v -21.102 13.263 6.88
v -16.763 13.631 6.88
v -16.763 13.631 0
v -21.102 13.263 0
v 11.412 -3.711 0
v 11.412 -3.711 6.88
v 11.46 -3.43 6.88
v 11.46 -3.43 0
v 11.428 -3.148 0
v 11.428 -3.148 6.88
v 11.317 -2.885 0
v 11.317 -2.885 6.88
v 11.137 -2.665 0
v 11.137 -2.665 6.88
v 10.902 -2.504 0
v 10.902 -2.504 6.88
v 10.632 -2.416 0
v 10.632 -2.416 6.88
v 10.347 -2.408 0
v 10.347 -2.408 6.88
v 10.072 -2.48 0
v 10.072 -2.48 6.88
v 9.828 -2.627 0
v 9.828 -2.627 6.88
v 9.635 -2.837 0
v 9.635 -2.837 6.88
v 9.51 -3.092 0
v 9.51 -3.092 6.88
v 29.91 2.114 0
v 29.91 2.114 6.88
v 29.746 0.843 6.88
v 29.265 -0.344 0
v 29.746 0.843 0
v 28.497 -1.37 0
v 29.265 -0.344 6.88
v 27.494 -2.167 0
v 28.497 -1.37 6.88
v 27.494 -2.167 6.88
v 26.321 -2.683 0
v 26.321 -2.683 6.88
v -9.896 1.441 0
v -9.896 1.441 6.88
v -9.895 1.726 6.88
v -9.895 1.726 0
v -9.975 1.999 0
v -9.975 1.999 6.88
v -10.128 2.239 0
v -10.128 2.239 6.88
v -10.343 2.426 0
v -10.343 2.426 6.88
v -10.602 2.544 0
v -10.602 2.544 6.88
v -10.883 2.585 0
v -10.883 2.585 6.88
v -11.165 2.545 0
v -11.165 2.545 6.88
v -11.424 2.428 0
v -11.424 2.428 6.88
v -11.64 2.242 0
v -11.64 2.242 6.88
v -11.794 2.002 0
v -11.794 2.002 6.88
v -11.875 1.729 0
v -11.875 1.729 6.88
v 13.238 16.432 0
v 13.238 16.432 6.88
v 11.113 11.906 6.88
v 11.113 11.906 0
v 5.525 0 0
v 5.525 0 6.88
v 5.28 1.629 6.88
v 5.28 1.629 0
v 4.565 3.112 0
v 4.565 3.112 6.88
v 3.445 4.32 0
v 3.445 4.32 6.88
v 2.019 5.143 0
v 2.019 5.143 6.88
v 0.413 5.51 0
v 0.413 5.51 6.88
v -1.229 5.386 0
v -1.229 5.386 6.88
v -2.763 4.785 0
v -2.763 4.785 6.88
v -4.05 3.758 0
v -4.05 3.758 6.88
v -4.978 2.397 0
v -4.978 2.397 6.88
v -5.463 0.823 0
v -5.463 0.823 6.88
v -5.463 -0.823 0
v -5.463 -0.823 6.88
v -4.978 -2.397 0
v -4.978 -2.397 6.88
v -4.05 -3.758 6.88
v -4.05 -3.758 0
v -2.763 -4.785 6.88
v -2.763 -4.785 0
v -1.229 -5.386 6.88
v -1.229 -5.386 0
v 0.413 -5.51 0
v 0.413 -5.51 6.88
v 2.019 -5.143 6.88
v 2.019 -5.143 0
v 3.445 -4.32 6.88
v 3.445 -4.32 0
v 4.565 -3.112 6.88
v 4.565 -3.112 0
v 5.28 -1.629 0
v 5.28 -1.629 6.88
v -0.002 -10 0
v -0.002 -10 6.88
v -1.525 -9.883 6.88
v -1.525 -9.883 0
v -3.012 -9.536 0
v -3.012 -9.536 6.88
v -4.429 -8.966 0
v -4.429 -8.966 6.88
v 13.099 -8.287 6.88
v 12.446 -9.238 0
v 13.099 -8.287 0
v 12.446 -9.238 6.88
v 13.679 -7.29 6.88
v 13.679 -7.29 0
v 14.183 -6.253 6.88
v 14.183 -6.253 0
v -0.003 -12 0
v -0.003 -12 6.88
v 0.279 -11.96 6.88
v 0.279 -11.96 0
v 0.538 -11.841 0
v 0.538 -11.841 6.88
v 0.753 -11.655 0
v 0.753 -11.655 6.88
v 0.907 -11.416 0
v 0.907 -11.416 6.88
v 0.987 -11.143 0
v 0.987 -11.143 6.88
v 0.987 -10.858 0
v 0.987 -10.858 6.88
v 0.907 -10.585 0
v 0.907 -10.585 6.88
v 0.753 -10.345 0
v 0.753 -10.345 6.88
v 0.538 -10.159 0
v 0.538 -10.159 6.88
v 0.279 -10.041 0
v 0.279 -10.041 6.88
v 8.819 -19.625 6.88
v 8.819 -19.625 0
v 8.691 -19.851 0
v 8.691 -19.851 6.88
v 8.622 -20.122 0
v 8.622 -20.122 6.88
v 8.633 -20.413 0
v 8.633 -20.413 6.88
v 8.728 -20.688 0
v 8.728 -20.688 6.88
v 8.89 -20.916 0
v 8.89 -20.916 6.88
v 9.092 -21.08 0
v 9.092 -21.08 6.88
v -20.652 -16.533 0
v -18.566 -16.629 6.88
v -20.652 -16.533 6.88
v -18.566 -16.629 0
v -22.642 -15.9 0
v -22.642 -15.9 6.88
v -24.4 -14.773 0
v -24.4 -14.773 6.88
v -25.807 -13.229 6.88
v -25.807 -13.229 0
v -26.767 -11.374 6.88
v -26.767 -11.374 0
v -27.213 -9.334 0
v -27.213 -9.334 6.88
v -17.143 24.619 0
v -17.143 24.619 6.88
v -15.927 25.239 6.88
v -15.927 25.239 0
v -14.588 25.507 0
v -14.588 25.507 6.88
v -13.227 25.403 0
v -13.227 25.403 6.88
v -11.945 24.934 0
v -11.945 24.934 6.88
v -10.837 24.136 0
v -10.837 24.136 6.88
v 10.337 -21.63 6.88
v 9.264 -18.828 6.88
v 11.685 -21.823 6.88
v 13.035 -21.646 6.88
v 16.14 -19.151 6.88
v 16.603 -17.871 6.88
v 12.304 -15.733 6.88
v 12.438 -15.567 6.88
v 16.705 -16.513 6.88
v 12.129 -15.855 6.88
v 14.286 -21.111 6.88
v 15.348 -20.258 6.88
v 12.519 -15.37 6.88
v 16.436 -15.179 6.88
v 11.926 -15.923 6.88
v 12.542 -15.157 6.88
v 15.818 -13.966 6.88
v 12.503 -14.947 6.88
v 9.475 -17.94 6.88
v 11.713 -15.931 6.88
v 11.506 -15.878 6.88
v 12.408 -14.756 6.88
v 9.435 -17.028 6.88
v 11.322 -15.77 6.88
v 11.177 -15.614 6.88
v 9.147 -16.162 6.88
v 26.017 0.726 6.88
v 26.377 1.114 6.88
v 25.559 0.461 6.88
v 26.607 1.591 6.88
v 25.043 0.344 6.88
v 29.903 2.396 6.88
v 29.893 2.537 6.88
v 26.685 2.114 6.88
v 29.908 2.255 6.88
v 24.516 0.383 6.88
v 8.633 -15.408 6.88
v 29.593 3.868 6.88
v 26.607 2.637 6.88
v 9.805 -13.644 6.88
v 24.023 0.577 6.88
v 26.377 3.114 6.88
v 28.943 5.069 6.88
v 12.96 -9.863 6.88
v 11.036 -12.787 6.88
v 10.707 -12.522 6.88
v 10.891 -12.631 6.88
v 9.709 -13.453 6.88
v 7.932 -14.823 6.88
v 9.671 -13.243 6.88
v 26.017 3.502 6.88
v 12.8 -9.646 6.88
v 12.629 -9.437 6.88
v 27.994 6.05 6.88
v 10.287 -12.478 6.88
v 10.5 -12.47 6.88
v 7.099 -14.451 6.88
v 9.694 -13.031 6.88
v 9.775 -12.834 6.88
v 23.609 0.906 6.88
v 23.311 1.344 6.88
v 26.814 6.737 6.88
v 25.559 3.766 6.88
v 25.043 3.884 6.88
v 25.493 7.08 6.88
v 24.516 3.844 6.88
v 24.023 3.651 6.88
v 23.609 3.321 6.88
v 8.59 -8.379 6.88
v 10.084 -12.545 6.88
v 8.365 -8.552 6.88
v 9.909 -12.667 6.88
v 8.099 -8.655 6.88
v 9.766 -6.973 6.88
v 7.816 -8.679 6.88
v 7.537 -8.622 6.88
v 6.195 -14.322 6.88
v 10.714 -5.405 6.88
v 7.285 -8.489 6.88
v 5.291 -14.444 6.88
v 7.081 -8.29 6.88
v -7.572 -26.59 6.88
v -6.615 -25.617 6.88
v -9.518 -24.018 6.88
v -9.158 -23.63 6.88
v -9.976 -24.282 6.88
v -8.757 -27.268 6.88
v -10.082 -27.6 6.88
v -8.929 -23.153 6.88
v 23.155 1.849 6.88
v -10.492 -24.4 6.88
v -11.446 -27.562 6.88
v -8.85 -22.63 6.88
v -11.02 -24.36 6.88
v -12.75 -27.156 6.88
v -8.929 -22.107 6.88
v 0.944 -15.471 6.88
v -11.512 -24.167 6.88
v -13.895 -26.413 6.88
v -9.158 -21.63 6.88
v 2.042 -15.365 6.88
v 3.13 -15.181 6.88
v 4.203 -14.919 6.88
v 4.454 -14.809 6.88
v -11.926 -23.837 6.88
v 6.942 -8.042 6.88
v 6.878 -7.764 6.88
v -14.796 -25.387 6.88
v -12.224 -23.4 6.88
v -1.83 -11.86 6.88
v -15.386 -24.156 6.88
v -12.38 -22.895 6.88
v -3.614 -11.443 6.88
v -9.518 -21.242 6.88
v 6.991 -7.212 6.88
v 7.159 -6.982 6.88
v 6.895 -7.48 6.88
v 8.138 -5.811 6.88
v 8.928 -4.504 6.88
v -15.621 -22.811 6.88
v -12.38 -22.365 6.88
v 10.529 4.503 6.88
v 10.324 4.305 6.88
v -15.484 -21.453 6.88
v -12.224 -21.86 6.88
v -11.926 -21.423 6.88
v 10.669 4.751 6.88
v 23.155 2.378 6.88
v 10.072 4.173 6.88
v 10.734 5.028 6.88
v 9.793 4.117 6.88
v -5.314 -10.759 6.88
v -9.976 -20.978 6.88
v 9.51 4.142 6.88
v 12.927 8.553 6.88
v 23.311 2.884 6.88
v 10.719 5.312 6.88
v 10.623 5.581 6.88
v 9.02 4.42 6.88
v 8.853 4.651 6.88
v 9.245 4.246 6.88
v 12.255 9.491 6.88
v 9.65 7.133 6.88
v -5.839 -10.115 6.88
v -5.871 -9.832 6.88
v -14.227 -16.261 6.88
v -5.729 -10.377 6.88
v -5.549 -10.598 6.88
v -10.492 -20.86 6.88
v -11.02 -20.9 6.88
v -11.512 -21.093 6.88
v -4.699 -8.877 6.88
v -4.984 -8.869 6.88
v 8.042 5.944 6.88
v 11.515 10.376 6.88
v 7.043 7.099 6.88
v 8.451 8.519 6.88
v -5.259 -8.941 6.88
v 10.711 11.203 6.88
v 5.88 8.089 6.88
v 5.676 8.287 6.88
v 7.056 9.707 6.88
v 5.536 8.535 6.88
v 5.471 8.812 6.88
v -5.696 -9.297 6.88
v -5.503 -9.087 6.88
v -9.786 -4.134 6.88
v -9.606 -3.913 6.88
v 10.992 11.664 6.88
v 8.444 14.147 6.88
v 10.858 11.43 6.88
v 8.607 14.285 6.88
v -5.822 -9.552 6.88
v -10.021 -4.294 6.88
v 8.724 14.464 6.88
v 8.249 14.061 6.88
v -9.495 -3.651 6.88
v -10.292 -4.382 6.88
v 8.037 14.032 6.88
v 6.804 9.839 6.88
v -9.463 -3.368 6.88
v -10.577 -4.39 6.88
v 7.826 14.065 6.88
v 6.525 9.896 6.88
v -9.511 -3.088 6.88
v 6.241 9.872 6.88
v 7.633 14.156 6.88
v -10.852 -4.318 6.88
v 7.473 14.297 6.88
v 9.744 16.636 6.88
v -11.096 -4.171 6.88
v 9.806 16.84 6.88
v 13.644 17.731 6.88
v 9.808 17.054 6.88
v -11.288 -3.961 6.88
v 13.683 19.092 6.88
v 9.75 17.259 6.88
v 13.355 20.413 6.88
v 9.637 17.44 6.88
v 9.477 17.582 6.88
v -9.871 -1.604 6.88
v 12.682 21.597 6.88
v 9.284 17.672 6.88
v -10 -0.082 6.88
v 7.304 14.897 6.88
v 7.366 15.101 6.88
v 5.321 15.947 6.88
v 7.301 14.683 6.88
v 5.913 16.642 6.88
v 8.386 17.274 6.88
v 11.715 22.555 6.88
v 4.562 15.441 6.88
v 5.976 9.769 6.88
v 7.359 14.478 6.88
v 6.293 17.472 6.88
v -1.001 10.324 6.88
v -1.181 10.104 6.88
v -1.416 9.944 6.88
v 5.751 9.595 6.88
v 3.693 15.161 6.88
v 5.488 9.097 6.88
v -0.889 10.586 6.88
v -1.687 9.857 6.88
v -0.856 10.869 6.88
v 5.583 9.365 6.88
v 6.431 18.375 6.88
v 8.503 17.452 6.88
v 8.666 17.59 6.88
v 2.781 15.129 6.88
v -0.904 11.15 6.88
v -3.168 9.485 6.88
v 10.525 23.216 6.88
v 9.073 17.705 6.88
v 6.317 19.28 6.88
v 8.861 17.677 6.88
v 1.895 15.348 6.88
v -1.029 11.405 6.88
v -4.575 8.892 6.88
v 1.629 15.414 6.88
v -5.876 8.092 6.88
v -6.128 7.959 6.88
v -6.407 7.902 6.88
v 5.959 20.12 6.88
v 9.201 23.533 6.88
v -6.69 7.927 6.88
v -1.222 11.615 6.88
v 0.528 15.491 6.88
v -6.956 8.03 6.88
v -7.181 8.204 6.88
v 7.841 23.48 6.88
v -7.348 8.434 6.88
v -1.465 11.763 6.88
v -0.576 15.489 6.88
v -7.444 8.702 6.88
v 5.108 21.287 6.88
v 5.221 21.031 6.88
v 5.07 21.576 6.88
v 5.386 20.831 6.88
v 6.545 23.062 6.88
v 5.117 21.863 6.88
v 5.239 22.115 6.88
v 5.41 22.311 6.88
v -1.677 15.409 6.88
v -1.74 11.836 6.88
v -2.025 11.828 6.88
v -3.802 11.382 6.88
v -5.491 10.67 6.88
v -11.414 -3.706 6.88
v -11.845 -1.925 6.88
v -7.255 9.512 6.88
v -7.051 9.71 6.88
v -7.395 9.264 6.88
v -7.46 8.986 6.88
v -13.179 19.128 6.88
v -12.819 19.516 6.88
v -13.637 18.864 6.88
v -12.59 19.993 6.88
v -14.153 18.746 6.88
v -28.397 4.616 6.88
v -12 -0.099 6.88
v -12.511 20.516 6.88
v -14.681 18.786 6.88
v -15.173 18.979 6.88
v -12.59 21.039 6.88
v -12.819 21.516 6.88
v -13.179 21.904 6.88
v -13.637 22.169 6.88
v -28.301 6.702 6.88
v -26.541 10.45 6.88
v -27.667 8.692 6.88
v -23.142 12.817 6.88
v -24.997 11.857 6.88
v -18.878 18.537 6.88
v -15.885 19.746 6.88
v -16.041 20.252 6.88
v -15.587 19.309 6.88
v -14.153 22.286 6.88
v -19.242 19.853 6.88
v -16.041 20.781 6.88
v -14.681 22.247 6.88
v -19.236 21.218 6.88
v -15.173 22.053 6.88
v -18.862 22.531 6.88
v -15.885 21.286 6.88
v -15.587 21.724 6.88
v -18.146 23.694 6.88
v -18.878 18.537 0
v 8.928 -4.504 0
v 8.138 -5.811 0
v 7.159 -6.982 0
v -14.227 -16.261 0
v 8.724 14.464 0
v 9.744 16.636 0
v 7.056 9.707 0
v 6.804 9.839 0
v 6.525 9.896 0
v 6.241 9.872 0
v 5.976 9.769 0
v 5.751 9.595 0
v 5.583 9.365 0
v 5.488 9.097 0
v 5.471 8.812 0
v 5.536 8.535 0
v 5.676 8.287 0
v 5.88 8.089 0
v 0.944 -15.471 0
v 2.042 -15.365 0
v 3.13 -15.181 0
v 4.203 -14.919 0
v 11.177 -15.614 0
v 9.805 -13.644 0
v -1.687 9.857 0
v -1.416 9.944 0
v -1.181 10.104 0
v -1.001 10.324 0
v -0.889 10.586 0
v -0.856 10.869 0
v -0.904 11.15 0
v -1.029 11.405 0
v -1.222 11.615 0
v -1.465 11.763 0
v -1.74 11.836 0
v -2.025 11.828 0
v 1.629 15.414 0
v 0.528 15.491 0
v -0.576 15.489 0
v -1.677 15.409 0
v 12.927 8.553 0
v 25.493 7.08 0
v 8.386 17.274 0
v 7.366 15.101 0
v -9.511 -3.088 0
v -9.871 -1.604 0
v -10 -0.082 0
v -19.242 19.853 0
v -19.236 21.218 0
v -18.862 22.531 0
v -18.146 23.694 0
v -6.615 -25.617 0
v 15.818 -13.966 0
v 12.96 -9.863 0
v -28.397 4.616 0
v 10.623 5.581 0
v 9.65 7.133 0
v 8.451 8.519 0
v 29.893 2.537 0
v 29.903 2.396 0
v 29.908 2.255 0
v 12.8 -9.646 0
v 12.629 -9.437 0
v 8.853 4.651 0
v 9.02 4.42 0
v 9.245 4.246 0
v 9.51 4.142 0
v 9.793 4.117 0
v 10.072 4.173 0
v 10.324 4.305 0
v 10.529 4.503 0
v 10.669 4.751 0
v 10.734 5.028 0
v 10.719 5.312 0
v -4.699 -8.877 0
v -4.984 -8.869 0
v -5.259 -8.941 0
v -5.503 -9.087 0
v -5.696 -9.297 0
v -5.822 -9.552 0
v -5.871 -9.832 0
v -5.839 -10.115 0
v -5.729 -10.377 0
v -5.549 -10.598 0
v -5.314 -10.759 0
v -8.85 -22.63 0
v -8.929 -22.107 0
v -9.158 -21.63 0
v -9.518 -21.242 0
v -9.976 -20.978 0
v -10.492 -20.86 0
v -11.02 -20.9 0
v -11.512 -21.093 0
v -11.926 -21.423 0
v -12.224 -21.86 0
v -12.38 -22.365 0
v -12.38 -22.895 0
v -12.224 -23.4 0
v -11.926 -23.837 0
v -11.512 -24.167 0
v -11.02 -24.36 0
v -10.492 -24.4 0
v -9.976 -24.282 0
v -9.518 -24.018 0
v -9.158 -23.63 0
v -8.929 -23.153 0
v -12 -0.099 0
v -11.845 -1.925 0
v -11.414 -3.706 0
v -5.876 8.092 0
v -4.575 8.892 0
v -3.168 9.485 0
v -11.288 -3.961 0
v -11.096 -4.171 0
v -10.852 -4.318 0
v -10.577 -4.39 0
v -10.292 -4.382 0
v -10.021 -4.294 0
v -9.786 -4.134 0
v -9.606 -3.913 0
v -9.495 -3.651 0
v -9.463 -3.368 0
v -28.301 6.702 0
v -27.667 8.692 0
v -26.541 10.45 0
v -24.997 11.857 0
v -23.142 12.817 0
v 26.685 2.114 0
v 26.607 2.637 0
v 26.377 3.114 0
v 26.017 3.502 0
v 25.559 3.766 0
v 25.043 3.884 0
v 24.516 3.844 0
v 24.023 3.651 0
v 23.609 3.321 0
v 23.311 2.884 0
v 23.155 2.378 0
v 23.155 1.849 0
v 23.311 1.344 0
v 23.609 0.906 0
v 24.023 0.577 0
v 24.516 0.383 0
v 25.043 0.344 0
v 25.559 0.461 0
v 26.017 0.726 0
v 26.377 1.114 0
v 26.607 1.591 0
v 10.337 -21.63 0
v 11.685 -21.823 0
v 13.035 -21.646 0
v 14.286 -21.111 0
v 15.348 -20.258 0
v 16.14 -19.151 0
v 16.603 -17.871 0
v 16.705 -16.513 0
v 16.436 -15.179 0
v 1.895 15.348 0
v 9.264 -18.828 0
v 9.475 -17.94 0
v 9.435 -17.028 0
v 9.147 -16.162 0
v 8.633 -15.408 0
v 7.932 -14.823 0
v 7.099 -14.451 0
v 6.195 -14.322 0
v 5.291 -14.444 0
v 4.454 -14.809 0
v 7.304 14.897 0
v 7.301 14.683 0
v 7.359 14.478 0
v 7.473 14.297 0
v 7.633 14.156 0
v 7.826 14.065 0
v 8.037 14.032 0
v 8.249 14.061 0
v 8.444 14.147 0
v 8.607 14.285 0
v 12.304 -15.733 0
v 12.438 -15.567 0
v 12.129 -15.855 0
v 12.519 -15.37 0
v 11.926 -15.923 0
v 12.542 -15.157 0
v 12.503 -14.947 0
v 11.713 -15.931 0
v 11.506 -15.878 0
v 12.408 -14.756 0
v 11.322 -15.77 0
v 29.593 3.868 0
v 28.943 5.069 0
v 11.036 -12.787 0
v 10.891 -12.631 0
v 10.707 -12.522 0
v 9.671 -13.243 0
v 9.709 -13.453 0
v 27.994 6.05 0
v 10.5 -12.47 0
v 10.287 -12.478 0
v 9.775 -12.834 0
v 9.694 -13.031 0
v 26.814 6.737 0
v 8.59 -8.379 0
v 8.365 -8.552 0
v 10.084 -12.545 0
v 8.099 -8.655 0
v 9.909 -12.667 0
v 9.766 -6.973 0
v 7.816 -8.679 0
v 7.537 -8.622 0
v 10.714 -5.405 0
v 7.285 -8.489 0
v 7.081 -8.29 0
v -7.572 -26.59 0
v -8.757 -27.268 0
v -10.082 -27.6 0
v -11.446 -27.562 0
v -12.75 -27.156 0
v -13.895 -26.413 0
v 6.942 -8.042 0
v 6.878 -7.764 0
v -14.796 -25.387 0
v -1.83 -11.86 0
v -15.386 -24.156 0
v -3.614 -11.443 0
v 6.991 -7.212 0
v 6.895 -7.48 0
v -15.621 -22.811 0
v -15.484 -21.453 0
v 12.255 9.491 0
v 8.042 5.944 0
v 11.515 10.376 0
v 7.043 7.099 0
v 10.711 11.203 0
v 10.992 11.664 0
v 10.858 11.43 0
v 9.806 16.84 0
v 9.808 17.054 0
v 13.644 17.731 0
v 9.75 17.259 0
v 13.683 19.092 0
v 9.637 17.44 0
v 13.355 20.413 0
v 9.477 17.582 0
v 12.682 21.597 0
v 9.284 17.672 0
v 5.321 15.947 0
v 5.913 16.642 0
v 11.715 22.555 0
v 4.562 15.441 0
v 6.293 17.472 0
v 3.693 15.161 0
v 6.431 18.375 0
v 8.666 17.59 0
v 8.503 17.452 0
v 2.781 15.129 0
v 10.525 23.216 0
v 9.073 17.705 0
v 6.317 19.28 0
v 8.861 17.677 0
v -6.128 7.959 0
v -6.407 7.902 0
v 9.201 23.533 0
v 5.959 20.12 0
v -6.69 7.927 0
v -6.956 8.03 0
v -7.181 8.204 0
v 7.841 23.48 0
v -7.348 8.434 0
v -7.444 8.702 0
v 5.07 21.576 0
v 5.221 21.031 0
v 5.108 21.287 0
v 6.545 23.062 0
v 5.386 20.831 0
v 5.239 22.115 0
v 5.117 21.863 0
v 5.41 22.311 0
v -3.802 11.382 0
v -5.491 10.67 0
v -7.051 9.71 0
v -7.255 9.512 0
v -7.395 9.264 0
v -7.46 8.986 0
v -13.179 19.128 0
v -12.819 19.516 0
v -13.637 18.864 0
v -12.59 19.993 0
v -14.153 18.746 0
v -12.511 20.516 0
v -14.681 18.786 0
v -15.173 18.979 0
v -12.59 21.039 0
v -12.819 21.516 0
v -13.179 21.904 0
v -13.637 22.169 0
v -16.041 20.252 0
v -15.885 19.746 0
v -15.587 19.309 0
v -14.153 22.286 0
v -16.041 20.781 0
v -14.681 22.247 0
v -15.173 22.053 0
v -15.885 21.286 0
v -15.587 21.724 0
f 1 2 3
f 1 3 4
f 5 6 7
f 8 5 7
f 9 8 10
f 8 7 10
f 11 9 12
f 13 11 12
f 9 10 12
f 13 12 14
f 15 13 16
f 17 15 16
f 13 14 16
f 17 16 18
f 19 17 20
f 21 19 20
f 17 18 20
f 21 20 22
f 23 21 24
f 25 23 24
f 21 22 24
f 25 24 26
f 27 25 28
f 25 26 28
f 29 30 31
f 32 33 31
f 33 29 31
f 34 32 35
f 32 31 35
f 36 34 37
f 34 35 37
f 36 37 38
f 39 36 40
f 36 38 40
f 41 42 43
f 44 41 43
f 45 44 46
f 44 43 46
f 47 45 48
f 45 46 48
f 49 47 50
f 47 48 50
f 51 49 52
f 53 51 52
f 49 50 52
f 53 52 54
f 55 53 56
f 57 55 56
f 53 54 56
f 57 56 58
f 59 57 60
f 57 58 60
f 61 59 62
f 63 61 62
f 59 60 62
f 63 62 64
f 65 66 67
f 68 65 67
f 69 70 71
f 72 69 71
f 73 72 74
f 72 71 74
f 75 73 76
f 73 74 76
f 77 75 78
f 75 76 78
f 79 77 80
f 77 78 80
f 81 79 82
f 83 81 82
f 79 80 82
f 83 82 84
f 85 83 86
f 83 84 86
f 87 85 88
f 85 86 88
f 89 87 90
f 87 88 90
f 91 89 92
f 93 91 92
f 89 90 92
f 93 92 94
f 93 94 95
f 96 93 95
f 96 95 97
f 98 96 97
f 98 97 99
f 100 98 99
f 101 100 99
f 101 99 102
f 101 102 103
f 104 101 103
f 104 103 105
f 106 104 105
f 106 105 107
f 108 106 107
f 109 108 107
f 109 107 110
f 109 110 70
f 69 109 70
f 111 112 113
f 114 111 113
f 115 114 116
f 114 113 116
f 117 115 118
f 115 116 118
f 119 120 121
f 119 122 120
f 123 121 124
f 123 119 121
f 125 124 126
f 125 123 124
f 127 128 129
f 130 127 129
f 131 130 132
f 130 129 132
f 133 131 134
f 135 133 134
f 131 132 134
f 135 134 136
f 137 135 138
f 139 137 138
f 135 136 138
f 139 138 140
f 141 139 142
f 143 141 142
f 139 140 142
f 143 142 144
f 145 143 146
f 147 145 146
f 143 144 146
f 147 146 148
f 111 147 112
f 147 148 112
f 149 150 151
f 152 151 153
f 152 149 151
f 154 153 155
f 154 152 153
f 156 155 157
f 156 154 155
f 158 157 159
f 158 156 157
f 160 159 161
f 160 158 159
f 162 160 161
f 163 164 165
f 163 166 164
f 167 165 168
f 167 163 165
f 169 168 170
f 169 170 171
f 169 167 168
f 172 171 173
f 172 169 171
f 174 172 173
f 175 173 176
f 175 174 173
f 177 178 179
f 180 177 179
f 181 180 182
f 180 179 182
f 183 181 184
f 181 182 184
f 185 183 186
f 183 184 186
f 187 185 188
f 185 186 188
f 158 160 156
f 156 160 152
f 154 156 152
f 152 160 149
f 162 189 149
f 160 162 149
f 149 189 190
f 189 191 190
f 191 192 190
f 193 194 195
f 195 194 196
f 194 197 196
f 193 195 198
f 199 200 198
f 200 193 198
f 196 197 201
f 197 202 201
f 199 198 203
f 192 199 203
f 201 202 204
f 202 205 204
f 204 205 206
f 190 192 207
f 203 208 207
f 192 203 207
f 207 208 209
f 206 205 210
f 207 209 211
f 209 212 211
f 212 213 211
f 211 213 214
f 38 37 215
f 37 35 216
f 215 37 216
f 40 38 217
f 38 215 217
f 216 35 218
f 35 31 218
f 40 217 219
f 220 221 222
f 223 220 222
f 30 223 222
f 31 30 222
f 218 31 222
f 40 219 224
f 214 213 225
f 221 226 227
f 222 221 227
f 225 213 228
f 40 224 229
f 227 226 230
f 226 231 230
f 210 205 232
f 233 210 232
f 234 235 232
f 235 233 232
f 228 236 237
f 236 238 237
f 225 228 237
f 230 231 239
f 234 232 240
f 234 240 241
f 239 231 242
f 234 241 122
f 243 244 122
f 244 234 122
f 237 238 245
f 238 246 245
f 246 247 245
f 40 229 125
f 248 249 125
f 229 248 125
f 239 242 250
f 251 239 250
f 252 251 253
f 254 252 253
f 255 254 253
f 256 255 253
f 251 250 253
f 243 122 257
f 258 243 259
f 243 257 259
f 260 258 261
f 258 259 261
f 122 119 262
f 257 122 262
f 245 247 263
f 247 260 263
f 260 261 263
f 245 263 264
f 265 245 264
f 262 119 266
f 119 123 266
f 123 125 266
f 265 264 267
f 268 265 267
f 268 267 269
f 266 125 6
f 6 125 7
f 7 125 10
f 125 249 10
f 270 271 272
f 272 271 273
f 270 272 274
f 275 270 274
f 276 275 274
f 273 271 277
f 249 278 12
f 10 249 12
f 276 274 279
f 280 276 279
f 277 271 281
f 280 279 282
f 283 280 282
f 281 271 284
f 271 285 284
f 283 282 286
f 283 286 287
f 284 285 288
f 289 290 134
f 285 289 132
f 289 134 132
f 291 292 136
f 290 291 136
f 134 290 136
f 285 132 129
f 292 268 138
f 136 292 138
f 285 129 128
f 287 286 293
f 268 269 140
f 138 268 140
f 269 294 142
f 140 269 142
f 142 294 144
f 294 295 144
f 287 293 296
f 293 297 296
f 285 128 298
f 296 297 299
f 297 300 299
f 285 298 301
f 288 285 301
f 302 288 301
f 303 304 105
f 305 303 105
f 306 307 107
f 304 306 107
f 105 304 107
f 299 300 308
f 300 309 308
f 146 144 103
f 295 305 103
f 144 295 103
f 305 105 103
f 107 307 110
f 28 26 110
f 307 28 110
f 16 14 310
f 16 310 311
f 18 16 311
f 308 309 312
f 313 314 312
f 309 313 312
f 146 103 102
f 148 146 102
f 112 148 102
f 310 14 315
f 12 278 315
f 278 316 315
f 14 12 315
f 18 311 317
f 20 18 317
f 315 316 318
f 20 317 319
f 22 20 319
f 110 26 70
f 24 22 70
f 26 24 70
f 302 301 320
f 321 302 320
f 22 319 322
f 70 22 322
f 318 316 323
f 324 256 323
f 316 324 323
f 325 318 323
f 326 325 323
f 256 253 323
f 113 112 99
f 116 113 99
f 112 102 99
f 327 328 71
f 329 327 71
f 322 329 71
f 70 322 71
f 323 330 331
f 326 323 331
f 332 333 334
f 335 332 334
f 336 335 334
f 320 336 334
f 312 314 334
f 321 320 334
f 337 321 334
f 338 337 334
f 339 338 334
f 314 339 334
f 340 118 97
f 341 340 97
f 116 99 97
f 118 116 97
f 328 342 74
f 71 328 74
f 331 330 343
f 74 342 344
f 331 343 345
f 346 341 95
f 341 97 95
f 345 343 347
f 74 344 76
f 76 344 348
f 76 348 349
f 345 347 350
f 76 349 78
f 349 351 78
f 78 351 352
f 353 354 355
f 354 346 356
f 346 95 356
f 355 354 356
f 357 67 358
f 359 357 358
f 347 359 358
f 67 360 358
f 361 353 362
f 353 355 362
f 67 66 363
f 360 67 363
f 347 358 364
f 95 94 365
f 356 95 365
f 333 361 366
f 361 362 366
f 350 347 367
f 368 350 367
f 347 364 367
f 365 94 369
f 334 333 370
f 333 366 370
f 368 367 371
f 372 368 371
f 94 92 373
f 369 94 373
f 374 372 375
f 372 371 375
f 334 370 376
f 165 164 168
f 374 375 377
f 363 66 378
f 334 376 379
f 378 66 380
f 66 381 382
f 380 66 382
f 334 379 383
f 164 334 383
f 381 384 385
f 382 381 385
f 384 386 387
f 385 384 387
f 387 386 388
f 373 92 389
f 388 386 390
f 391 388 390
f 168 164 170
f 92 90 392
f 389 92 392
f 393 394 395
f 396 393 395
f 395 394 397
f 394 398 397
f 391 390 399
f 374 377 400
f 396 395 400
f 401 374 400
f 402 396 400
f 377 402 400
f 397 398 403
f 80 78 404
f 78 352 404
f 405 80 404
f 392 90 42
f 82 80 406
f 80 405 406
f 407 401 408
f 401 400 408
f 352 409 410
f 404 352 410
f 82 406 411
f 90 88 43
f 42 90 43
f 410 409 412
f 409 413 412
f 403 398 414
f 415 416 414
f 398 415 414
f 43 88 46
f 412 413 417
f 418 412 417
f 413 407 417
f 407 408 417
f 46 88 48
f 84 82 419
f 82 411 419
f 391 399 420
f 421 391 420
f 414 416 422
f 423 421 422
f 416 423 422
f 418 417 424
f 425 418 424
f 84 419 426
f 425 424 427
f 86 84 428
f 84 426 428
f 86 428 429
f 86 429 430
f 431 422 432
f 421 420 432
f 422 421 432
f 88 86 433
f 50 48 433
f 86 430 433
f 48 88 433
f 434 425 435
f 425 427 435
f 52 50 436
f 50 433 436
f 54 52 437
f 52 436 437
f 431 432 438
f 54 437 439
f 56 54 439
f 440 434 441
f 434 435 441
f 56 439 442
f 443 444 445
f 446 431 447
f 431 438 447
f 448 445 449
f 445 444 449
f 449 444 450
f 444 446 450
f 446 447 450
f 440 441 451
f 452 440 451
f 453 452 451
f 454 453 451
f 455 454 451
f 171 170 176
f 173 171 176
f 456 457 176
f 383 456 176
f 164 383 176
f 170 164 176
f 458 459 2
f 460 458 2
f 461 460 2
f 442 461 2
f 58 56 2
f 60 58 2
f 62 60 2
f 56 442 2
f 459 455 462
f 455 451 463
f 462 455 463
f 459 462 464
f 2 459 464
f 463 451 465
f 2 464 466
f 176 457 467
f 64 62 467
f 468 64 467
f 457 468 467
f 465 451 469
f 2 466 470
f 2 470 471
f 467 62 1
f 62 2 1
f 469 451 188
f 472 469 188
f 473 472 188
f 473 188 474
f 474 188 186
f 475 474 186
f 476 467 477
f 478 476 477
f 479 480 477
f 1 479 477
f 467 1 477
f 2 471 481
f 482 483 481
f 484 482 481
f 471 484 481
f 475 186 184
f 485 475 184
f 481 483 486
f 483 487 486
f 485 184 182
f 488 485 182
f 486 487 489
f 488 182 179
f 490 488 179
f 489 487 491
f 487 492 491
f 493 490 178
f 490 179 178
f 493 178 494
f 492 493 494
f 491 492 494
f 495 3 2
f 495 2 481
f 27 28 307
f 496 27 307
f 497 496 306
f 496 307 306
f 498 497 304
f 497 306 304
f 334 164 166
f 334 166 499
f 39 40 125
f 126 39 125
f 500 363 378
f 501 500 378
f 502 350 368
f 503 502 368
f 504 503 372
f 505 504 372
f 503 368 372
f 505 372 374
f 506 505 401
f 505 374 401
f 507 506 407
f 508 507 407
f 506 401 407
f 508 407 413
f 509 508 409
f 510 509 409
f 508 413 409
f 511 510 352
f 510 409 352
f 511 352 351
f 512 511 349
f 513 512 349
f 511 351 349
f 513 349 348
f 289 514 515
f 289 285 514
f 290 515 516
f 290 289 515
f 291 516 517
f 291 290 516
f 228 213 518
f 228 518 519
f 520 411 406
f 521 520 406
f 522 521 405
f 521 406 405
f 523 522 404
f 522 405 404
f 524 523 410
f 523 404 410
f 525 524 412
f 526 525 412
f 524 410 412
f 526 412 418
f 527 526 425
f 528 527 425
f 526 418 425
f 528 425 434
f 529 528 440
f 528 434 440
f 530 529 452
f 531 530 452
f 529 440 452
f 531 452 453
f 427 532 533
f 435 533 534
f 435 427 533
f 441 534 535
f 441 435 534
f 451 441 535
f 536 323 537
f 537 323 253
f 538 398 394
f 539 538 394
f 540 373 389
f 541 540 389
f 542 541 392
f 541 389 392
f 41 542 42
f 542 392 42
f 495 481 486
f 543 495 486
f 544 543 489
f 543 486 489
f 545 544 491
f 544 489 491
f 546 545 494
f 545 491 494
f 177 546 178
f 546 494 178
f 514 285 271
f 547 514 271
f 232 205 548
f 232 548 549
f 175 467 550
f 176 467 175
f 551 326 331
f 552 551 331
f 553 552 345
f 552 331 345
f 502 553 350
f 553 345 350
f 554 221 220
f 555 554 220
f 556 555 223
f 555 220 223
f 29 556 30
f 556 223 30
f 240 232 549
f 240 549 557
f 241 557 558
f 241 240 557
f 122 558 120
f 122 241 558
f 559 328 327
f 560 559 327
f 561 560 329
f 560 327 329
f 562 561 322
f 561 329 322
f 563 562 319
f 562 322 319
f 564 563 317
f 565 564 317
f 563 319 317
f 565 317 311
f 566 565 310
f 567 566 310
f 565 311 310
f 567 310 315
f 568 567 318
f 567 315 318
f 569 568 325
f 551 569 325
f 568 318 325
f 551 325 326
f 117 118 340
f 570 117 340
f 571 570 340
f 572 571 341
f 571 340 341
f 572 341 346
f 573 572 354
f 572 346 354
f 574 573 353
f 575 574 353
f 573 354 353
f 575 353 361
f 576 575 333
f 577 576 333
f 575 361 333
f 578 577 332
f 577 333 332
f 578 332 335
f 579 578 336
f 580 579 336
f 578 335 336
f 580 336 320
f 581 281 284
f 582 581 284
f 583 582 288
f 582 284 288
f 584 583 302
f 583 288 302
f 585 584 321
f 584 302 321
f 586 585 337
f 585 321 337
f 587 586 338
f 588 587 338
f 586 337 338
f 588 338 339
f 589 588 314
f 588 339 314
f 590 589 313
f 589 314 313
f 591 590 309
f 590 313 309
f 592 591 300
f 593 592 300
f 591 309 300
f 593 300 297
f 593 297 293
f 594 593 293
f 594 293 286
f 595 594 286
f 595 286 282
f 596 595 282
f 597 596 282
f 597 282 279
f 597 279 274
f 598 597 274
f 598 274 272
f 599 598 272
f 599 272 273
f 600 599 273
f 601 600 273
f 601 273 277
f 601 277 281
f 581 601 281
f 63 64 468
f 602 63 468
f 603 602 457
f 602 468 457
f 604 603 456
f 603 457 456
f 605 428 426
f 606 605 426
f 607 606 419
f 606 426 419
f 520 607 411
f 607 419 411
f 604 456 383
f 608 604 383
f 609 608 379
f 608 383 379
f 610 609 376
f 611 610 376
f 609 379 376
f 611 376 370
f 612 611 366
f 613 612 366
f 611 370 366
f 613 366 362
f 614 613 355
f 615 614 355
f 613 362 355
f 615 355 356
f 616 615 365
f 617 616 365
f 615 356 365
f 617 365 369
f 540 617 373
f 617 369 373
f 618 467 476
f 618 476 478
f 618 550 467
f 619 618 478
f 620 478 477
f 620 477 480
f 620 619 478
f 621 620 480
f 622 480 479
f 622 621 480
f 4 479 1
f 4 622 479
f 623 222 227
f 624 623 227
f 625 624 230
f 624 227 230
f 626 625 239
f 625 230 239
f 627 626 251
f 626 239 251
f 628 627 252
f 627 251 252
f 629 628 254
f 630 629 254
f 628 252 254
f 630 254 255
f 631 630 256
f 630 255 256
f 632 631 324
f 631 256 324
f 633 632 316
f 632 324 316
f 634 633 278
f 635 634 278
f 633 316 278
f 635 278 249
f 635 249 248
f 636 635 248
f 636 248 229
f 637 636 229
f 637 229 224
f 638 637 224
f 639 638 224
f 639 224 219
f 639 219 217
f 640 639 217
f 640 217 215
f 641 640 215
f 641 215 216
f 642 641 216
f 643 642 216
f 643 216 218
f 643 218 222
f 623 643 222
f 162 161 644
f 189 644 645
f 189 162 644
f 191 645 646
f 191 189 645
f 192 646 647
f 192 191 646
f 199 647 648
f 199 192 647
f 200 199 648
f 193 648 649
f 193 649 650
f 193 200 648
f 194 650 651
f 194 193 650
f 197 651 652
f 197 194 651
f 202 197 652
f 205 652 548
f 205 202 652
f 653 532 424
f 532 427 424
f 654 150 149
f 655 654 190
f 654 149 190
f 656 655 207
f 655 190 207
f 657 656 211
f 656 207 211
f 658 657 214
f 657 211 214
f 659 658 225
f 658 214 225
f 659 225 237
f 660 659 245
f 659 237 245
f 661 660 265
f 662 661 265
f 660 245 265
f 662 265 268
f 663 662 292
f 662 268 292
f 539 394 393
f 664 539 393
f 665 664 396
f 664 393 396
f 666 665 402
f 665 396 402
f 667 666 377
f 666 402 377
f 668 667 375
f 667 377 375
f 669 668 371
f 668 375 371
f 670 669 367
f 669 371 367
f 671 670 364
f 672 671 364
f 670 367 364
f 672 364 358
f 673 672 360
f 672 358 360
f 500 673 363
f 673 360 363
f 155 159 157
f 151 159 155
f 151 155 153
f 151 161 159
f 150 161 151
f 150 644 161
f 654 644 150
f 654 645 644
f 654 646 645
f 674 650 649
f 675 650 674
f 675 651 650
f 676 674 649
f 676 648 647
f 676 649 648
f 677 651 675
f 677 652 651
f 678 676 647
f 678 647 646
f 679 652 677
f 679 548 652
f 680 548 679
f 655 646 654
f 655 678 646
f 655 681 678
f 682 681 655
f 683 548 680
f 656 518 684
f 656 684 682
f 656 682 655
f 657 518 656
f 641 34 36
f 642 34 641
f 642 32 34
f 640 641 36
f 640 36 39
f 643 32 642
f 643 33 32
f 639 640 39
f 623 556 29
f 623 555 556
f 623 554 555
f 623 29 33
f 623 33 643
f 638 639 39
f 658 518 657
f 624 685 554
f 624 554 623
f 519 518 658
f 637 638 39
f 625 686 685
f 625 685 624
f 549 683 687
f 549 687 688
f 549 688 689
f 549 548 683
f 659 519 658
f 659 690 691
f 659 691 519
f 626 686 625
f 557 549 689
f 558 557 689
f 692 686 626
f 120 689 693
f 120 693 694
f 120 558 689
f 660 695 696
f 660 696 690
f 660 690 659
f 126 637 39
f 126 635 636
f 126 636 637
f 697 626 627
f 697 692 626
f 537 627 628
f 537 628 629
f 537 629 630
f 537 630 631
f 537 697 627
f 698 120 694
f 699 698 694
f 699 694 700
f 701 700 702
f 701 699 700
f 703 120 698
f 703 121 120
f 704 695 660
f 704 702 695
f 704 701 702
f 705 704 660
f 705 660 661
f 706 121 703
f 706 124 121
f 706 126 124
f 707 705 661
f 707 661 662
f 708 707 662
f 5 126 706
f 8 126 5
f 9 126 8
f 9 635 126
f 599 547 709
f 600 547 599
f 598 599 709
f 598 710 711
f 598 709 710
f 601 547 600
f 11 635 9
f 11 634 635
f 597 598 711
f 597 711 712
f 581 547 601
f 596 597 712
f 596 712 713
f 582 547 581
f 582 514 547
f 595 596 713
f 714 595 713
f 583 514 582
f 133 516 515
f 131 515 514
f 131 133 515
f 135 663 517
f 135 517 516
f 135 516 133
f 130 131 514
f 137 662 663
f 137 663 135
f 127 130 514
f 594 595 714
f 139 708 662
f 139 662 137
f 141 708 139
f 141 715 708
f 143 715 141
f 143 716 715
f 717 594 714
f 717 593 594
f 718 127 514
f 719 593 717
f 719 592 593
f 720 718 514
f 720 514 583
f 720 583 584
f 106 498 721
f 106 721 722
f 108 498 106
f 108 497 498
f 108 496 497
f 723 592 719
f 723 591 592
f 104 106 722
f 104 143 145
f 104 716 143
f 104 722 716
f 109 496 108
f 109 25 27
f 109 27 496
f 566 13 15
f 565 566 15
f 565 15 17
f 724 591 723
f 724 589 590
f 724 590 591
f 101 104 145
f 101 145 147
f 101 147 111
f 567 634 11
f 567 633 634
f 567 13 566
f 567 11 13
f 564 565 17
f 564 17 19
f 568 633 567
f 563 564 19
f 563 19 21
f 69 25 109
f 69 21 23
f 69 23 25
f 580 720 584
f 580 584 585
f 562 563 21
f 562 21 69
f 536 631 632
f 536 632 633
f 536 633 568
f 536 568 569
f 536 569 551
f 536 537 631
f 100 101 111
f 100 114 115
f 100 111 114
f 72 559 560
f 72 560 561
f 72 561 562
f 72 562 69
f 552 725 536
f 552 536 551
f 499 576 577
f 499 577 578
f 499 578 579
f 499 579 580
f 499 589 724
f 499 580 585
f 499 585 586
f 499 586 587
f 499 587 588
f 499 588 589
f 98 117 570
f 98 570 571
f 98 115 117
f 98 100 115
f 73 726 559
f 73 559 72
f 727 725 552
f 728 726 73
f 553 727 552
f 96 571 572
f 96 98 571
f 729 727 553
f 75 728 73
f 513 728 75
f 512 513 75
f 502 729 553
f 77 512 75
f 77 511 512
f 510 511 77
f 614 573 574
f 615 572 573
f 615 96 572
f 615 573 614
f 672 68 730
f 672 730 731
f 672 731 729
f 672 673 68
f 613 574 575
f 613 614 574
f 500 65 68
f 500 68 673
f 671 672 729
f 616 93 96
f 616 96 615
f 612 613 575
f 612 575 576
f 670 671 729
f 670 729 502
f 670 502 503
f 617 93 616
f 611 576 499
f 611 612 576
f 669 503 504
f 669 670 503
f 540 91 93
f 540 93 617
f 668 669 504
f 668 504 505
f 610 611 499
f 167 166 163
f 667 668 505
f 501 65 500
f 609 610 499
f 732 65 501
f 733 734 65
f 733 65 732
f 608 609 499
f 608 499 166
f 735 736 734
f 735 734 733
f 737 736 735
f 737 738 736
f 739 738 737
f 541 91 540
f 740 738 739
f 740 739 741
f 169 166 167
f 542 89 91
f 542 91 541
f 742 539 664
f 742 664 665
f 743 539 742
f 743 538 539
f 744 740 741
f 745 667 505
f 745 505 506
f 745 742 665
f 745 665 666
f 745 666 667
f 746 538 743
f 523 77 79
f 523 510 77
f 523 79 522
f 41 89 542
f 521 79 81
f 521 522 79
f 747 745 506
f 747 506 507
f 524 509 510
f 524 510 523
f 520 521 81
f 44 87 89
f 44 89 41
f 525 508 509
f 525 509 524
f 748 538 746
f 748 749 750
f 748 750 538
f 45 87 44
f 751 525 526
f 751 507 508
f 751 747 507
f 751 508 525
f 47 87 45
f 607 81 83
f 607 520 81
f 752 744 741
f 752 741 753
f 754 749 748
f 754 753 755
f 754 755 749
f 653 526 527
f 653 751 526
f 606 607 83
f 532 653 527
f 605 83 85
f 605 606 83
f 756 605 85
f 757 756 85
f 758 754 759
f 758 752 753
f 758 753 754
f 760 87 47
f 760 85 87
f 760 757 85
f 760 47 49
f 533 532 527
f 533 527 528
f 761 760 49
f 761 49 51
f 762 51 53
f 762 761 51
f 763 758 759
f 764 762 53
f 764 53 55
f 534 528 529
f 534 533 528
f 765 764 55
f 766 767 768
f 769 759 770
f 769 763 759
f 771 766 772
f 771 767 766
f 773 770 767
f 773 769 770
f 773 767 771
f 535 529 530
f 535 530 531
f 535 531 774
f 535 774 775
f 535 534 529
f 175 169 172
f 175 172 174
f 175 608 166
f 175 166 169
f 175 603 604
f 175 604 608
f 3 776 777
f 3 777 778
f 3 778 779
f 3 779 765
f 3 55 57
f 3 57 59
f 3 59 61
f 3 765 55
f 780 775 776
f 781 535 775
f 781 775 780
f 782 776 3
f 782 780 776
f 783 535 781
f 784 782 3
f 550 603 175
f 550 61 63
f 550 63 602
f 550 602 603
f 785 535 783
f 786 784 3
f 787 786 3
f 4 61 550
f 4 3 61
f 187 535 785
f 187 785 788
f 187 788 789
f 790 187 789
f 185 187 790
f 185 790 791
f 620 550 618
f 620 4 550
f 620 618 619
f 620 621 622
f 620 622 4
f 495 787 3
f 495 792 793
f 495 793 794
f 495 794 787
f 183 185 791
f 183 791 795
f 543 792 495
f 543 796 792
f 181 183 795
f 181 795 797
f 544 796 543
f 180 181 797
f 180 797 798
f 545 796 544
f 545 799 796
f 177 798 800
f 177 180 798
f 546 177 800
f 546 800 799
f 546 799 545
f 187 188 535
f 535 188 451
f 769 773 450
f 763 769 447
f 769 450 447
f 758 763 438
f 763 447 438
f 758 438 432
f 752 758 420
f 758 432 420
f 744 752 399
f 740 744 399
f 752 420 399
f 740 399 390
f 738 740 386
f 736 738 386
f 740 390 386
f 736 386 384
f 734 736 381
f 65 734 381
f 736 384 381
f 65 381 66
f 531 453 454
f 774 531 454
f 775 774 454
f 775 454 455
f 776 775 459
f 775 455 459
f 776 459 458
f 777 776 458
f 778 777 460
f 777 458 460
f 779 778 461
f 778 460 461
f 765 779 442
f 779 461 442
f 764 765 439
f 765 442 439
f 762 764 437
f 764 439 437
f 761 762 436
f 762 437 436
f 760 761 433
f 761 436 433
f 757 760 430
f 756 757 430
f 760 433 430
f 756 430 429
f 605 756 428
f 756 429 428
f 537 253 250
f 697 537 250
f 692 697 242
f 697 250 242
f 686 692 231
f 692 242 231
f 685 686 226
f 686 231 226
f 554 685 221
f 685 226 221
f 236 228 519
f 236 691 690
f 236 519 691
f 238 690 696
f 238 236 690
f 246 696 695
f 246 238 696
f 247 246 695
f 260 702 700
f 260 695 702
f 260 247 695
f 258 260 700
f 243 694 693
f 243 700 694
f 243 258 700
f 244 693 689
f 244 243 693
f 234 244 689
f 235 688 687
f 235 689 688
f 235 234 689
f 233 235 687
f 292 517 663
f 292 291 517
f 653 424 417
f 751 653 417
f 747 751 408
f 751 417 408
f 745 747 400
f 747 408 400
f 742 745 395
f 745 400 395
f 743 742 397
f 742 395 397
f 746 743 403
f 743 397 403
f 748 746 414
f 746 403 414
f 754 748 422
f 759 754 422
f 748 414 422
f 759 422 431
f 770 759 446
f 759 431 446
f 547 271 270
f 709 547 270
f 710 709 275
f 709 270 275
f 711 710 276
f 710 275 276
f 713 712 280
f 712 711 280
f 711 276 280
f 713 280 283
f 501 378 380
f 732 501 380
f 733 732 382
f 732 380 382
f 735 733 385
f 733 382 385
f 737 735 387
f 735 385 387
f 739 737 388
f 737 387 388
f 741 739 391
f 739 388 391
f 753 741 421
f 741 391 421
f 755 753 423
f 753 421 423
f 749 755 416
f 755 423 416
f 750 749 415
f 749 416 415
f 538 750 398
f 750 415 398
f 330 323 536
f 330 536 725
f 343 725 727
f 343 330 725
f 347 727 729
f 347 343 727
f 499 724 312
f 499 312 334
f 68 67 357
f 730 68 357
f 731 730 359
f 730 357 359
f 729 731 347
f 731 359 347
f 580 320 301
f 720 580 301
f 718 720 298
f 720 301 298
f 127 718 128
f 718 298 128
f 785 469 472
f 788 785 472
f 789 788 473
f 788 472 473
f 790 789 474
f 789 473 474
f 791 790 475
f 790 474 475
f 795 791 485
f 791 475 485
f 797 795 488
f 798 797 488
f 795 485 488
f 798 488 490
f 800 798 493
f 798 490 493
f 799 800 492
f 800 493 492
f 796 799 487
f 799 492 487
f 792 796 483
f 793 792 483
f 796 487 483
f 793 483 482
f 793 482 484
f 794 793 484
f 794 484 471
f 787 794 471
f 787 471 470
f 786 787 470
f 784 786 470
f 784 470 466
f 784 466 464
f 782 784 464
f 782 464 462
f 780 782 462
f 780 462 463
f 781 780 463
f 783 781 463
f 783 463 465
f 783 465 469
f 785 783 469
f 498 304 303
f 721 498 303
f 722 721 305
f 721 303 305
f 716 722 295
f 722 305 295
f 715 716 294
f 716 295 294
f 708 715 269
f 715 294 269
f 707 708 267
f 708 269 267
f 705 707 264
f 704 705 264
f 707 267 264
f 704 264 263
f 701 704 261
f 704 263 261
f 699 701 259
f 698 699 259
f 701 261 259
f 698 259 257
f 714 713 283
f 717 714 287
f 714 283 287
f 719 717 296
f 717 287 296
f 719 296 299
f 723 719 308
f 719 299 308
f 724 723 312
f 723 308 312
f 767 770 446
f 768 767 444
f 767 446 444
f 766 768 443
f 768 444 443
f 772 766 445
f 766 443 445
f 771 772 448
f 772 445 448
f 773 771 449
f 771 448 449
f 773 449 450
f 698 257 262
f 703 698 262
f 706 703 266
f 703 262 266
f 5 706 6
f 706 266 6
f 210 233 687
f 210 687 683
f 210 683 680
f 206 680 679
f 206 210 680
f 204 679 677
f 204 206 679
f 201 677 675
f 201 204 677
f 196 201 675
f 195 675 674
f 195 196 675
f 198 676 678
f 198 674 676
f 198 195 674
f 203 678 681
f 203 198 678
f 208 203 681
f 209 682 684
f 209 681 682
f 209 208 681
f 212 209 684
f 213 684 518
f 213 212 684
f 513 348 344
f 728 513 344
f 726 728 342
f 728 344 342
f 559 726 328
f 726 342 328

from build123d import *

# Parameters (mm, degrees)
SKETCH1_R           = 30
BOSS_EXTRUDE1_DEPTH = 6.88
SKETCH2_R           = 1.775
CUT_EXTRUDE1_DEPTH  = 7.88
SKETCH3_R           = 5.525
CUT_EXTRUDE2_DEPTH  = 7.88
SKETCH4_R           = 15.5
SKETCH4_R_2         = 5.525
BOSS_EXTRUDE2_DEPTH = 6.88
BOSS_EXTRUDE3_DEPTH = 6.88
FILLET1_R           = 8
BOSS_EXTRUDE4_DEPTH = 6.88
SKETCH8_R           = 3.307099625
CUT_EXTRUDE3_DEPTH  = 7.88
FILLET2_R           = 1
CUT_EXTRUDE4_DEPTH  = 7.8800001
CIRPATTERN7_COUNT   = 5


with BuildPart() as part:
    # Sketch1 → Boss-Extrude1 (new body)
    with BuildSketch(Plane.XY):
        Circle(SKETCH1_R)
    extrude(amount=BOSS_EXTRUDE1_DEPTH)

    # Sketch2 → Cut-Extrude1 (cut, through all)
    with BuildSketch(Plane.XY.offset(6.88)):
        with BuildLine():
            ThreePointArc((-12.74957851, -27.155998376), (-15.133105802, -24.791899388), (-15.484190638, -21.453201167))
            Line((-15.484190638, -21.453201167), (-10.504897898, -0.891395226))
            Line((-10.504897898, -0.891395226), (-18.877603208, 18.537424231))
            ThreePointArc((-18.877603208, 18.537424231), (-19.094099282, 21.887543025), (-17.142995258, 24.619458028))
            ThreePointArc((-17.142995258, 24.619458028), (-29.892573711, -2.536540344), (-12.74957851, -27.155998376))
        make_face()
        with BuildLine():
            ThreePointArc((29.89257372, 2.536540246), (12.74957851, 27.155998377), (-17.142995258, 24.619458028))
            ThreePointArc((-17.142995258, 24.619458028), (-13.90386181, 25.50160376), (-10.836921884, 24.136303033))
            Line((-10.836921884, 24.136303033), (4.480478038, 9.543206057))
            Line((4.480478038, 9.543206057), (25.492681909, 7.079771826))
            ThreePointArc((25.492681909, 7.079771826), (28.502217973, 5.59220348), (29.89257372, 2.536540246))
        make_face()
        with BuildLine():
            ThreePointArc((-6.6150787, -25.617196056), (-9.408118678, -27.479746561), (-12.74957851, -27.155998376))
            ThreePointArc((-12.74957851, -27.155998376), (16.085904462, -25.322789689), (30, 0))
            ThreePointArc((30, 0), (29.973131398, 1.269407029), (29.89257372, 2.536540246))
            ThreePointArc((29.89257372, 2.536540246), (29.905999993, 2.325351424), (29.910478091, 2.113783634))
            ThreePointArc((29.910478091, 2.113783634), (28.913799972, -0.881782076), (26.321112522, -2.683101866))
            Line((26.321112522, -2.683101866), (6.02441986, -8.65181083))
            Line((6.02441986, -8.65181083), (-6.6150787, -25.617196056))
        make_face()
        with Locations((-10.62464872, -22.629998665)):
            Circle(SKETCH2_R)
        with Locations((24.910478091, 2.113783634)):
            Circle(SKETCH2_R)
        with Locations((-14.285829371, 20.51621503)):
            Circle(SKETCH2_R)
    extrude(amount=-CUT_EXTRUDE1_DEPTH, mode=Mode.SUBTRACT)

    # Sketch3 → Cut-Extrude2 (cut, through all)
    with BuildSketch(Plane.XY.offset(6.88)):
        Circle(SKETCH3_R)
    extrude(amount=-CUT_EXTRUDE2_DEPTH, mode=Mode.SUBTRACT)

    # Sketch4 → Boss-Extrude2 (add)
    with BuildSketch(Plane.XY.offset(6.88)):
        Circle(SKETCH4_R)
        Circle(SKETCH4_R_2, mode=Mode.SUBTRACT)
    extrude(amount=-BOSS_EXTRUDE2_DEPTH)

    # Sketch6 → Boss-Extrude3 (add)
    with BuildSketch(Plane.XY.offset(6.88)):
        with BuildLine():
            Line((-5.159411249, 14.616103296), (-29.073470217, 12.586871007))
            Line((-29.073470217, 12.586871007), (-26.536929856, -17.305702703))
            Line((-26.536929856, -17.305702703), (-2.622870888, -15.276470414))
            ThreePointArc((-2.622870888, -15.276470414), (-15.444496417, -1.310545853), (-5.159411249, 14.616103296))
        make_face()
    extrude(amount=-BOSS_EXTRUDE3_DEPTH)

    # Fillet1
    fillet1_edges = [part.edges().sort_by_distance(p)[0] for p in [
        (-26.536929856, -17.305702703, 3.44),
        (-29.073470217, 12.586871007, 3.44),
    ]]
    fillet(fillet1_edges, radius=FILLET1_R)

    # Sketch7 → Boss-Extrude4 (add)
    with BuildSketch(Plane.XY.offset(6.88)):
        with BuildLine():
            Line((13.238211684, 16.431669161), (11.11328194, 11.905669428))
            ThreePointArc((11.11328194, 11.905669428), (4.462352462, 9.504599439), (2.061282474, 16.155528916))
            Line((2.061282474, 16.155528916), (4.186212218, 20.681528649))
            ThreePointArc((4.186212218, 20.681528649), (10.837141695, 23.082598638), (13.238211684, 16.431669161))
        make_face()
        with BuildLine():
            Line((15.817623091, -13.966130451), (12.960457216, -9.862887445))
            ThreePointArc((12.960457216, -9.862887445), (6.000048336, -8.616810313), (4.753971204, -15.577219193))
            Line((4.753971204, -15.577219193), (7.611137078, -19.680462199))
            ThreePointArc((7.611137078, -19.680462199), (14.571545959, -20.926539331), (15.817623091, -13.966130451))
        make_face()
    extrude(amount=-BOSS_EXTRUDE4_DEPTH)

    # Sketch8 → Cut-Extrude3 (cut, through all)
    with BuildSketch(Plane.XY.offset(6.88)):
        with Locations((6.182554141, -17.628840696)):
            Circle(SKETCH8_R)
        with Locations((3.123747346, 18.418528783)):
            Circle(SKETCH8_R)
        with BuildLine():
            Line((11.036190469, -12.786856964), (12.40767393, -14.756476568))
            ThreePointArc((12.40767393, -14.756476568), (12.22076236, -15.8005379), (11.176701028, -15.61362633))
            Line((11.176701028, -15.61362633), (9.805217567, -13.644006726))
            ThreePointArc((9.805217567, -13.644006726), (9.992129137, -12.599945394), (11.036190469, -12.786856964))
        make_face()
        with BuildLine():
            Line((8.723847544, 14.463598968), (9.743846426, 16.636148288))
            ThreePointArc((9.743846426, 16.636148288), (9.383685928, 17.63378771), (8.386046507, 17.273627211))
            Line((8.386046507, 17.273627211), (7.366047624, 15.101077892))
            ThreePointArc((7.366047624, 15.101077892), (7.726208122, 14.10343847), (8.723847544, 14.463598968))
        make_face()
    extrude(amount=-CUT_EXTRUDE3_DEPTH, mode=Mode.SUBTRACT)

    # Fillet2
    fillet2_edges = [part.edges().sort_by_distance(p)[0] for p in [
        (1.777810772, 15.39770726, 3.44),
        (4.346861748, -14.87799694, 3.44),
        (4.588201724, 21.383706907, 3.44),
        (8.125694034, -20.304866722, 3.44),
    ]]
    fillet(fillet2_edges, radius=FILLET2_R)

    # Sketch10 → Cut-Extrude4 (cut, through all)
    with BuildSketch(Plane.XY.offset(6.88)):
        with BuildLine():
            ThreePointArc((-11.874722343, 1.729441895), (-11.957029484, -1.014616145), (-11.413533187, -3.705571507))
            ThreePointArc((-11.413533187, -3.705571507), (-10.153607796, -4.347901647), (-9.511277656, -3.087976256))
            ThreePointArc((-9.511277656, -3.087976256), (-9.964191237, -0.845513454), (-9.895601953, 1.441201579))
            ThreePointArc((-9.895601953, 1.441201579), (-10.74104199, 2.574881932), (-11.874722343, 1.729441895))
        make_face()
    cut_extrude4 = extrude(amount=-CUT_EXTRUDE4_DEPTH, mode=Mode.SUBTRACT)

    # CirPattern7: Cut-Extrude4 ×5 about axis
    cirpattern7_axis = Axis((0, 0, 0), (0, 0, 1))
    for i in range(1, CIRPATTERN7_COUNT):
        add(cut_extrude4.rotate(cirpattern7_axis, i * 360 / CIRPATTERN7_COUNT), mode=Mode.SUBTRACT)


solid = part.part
